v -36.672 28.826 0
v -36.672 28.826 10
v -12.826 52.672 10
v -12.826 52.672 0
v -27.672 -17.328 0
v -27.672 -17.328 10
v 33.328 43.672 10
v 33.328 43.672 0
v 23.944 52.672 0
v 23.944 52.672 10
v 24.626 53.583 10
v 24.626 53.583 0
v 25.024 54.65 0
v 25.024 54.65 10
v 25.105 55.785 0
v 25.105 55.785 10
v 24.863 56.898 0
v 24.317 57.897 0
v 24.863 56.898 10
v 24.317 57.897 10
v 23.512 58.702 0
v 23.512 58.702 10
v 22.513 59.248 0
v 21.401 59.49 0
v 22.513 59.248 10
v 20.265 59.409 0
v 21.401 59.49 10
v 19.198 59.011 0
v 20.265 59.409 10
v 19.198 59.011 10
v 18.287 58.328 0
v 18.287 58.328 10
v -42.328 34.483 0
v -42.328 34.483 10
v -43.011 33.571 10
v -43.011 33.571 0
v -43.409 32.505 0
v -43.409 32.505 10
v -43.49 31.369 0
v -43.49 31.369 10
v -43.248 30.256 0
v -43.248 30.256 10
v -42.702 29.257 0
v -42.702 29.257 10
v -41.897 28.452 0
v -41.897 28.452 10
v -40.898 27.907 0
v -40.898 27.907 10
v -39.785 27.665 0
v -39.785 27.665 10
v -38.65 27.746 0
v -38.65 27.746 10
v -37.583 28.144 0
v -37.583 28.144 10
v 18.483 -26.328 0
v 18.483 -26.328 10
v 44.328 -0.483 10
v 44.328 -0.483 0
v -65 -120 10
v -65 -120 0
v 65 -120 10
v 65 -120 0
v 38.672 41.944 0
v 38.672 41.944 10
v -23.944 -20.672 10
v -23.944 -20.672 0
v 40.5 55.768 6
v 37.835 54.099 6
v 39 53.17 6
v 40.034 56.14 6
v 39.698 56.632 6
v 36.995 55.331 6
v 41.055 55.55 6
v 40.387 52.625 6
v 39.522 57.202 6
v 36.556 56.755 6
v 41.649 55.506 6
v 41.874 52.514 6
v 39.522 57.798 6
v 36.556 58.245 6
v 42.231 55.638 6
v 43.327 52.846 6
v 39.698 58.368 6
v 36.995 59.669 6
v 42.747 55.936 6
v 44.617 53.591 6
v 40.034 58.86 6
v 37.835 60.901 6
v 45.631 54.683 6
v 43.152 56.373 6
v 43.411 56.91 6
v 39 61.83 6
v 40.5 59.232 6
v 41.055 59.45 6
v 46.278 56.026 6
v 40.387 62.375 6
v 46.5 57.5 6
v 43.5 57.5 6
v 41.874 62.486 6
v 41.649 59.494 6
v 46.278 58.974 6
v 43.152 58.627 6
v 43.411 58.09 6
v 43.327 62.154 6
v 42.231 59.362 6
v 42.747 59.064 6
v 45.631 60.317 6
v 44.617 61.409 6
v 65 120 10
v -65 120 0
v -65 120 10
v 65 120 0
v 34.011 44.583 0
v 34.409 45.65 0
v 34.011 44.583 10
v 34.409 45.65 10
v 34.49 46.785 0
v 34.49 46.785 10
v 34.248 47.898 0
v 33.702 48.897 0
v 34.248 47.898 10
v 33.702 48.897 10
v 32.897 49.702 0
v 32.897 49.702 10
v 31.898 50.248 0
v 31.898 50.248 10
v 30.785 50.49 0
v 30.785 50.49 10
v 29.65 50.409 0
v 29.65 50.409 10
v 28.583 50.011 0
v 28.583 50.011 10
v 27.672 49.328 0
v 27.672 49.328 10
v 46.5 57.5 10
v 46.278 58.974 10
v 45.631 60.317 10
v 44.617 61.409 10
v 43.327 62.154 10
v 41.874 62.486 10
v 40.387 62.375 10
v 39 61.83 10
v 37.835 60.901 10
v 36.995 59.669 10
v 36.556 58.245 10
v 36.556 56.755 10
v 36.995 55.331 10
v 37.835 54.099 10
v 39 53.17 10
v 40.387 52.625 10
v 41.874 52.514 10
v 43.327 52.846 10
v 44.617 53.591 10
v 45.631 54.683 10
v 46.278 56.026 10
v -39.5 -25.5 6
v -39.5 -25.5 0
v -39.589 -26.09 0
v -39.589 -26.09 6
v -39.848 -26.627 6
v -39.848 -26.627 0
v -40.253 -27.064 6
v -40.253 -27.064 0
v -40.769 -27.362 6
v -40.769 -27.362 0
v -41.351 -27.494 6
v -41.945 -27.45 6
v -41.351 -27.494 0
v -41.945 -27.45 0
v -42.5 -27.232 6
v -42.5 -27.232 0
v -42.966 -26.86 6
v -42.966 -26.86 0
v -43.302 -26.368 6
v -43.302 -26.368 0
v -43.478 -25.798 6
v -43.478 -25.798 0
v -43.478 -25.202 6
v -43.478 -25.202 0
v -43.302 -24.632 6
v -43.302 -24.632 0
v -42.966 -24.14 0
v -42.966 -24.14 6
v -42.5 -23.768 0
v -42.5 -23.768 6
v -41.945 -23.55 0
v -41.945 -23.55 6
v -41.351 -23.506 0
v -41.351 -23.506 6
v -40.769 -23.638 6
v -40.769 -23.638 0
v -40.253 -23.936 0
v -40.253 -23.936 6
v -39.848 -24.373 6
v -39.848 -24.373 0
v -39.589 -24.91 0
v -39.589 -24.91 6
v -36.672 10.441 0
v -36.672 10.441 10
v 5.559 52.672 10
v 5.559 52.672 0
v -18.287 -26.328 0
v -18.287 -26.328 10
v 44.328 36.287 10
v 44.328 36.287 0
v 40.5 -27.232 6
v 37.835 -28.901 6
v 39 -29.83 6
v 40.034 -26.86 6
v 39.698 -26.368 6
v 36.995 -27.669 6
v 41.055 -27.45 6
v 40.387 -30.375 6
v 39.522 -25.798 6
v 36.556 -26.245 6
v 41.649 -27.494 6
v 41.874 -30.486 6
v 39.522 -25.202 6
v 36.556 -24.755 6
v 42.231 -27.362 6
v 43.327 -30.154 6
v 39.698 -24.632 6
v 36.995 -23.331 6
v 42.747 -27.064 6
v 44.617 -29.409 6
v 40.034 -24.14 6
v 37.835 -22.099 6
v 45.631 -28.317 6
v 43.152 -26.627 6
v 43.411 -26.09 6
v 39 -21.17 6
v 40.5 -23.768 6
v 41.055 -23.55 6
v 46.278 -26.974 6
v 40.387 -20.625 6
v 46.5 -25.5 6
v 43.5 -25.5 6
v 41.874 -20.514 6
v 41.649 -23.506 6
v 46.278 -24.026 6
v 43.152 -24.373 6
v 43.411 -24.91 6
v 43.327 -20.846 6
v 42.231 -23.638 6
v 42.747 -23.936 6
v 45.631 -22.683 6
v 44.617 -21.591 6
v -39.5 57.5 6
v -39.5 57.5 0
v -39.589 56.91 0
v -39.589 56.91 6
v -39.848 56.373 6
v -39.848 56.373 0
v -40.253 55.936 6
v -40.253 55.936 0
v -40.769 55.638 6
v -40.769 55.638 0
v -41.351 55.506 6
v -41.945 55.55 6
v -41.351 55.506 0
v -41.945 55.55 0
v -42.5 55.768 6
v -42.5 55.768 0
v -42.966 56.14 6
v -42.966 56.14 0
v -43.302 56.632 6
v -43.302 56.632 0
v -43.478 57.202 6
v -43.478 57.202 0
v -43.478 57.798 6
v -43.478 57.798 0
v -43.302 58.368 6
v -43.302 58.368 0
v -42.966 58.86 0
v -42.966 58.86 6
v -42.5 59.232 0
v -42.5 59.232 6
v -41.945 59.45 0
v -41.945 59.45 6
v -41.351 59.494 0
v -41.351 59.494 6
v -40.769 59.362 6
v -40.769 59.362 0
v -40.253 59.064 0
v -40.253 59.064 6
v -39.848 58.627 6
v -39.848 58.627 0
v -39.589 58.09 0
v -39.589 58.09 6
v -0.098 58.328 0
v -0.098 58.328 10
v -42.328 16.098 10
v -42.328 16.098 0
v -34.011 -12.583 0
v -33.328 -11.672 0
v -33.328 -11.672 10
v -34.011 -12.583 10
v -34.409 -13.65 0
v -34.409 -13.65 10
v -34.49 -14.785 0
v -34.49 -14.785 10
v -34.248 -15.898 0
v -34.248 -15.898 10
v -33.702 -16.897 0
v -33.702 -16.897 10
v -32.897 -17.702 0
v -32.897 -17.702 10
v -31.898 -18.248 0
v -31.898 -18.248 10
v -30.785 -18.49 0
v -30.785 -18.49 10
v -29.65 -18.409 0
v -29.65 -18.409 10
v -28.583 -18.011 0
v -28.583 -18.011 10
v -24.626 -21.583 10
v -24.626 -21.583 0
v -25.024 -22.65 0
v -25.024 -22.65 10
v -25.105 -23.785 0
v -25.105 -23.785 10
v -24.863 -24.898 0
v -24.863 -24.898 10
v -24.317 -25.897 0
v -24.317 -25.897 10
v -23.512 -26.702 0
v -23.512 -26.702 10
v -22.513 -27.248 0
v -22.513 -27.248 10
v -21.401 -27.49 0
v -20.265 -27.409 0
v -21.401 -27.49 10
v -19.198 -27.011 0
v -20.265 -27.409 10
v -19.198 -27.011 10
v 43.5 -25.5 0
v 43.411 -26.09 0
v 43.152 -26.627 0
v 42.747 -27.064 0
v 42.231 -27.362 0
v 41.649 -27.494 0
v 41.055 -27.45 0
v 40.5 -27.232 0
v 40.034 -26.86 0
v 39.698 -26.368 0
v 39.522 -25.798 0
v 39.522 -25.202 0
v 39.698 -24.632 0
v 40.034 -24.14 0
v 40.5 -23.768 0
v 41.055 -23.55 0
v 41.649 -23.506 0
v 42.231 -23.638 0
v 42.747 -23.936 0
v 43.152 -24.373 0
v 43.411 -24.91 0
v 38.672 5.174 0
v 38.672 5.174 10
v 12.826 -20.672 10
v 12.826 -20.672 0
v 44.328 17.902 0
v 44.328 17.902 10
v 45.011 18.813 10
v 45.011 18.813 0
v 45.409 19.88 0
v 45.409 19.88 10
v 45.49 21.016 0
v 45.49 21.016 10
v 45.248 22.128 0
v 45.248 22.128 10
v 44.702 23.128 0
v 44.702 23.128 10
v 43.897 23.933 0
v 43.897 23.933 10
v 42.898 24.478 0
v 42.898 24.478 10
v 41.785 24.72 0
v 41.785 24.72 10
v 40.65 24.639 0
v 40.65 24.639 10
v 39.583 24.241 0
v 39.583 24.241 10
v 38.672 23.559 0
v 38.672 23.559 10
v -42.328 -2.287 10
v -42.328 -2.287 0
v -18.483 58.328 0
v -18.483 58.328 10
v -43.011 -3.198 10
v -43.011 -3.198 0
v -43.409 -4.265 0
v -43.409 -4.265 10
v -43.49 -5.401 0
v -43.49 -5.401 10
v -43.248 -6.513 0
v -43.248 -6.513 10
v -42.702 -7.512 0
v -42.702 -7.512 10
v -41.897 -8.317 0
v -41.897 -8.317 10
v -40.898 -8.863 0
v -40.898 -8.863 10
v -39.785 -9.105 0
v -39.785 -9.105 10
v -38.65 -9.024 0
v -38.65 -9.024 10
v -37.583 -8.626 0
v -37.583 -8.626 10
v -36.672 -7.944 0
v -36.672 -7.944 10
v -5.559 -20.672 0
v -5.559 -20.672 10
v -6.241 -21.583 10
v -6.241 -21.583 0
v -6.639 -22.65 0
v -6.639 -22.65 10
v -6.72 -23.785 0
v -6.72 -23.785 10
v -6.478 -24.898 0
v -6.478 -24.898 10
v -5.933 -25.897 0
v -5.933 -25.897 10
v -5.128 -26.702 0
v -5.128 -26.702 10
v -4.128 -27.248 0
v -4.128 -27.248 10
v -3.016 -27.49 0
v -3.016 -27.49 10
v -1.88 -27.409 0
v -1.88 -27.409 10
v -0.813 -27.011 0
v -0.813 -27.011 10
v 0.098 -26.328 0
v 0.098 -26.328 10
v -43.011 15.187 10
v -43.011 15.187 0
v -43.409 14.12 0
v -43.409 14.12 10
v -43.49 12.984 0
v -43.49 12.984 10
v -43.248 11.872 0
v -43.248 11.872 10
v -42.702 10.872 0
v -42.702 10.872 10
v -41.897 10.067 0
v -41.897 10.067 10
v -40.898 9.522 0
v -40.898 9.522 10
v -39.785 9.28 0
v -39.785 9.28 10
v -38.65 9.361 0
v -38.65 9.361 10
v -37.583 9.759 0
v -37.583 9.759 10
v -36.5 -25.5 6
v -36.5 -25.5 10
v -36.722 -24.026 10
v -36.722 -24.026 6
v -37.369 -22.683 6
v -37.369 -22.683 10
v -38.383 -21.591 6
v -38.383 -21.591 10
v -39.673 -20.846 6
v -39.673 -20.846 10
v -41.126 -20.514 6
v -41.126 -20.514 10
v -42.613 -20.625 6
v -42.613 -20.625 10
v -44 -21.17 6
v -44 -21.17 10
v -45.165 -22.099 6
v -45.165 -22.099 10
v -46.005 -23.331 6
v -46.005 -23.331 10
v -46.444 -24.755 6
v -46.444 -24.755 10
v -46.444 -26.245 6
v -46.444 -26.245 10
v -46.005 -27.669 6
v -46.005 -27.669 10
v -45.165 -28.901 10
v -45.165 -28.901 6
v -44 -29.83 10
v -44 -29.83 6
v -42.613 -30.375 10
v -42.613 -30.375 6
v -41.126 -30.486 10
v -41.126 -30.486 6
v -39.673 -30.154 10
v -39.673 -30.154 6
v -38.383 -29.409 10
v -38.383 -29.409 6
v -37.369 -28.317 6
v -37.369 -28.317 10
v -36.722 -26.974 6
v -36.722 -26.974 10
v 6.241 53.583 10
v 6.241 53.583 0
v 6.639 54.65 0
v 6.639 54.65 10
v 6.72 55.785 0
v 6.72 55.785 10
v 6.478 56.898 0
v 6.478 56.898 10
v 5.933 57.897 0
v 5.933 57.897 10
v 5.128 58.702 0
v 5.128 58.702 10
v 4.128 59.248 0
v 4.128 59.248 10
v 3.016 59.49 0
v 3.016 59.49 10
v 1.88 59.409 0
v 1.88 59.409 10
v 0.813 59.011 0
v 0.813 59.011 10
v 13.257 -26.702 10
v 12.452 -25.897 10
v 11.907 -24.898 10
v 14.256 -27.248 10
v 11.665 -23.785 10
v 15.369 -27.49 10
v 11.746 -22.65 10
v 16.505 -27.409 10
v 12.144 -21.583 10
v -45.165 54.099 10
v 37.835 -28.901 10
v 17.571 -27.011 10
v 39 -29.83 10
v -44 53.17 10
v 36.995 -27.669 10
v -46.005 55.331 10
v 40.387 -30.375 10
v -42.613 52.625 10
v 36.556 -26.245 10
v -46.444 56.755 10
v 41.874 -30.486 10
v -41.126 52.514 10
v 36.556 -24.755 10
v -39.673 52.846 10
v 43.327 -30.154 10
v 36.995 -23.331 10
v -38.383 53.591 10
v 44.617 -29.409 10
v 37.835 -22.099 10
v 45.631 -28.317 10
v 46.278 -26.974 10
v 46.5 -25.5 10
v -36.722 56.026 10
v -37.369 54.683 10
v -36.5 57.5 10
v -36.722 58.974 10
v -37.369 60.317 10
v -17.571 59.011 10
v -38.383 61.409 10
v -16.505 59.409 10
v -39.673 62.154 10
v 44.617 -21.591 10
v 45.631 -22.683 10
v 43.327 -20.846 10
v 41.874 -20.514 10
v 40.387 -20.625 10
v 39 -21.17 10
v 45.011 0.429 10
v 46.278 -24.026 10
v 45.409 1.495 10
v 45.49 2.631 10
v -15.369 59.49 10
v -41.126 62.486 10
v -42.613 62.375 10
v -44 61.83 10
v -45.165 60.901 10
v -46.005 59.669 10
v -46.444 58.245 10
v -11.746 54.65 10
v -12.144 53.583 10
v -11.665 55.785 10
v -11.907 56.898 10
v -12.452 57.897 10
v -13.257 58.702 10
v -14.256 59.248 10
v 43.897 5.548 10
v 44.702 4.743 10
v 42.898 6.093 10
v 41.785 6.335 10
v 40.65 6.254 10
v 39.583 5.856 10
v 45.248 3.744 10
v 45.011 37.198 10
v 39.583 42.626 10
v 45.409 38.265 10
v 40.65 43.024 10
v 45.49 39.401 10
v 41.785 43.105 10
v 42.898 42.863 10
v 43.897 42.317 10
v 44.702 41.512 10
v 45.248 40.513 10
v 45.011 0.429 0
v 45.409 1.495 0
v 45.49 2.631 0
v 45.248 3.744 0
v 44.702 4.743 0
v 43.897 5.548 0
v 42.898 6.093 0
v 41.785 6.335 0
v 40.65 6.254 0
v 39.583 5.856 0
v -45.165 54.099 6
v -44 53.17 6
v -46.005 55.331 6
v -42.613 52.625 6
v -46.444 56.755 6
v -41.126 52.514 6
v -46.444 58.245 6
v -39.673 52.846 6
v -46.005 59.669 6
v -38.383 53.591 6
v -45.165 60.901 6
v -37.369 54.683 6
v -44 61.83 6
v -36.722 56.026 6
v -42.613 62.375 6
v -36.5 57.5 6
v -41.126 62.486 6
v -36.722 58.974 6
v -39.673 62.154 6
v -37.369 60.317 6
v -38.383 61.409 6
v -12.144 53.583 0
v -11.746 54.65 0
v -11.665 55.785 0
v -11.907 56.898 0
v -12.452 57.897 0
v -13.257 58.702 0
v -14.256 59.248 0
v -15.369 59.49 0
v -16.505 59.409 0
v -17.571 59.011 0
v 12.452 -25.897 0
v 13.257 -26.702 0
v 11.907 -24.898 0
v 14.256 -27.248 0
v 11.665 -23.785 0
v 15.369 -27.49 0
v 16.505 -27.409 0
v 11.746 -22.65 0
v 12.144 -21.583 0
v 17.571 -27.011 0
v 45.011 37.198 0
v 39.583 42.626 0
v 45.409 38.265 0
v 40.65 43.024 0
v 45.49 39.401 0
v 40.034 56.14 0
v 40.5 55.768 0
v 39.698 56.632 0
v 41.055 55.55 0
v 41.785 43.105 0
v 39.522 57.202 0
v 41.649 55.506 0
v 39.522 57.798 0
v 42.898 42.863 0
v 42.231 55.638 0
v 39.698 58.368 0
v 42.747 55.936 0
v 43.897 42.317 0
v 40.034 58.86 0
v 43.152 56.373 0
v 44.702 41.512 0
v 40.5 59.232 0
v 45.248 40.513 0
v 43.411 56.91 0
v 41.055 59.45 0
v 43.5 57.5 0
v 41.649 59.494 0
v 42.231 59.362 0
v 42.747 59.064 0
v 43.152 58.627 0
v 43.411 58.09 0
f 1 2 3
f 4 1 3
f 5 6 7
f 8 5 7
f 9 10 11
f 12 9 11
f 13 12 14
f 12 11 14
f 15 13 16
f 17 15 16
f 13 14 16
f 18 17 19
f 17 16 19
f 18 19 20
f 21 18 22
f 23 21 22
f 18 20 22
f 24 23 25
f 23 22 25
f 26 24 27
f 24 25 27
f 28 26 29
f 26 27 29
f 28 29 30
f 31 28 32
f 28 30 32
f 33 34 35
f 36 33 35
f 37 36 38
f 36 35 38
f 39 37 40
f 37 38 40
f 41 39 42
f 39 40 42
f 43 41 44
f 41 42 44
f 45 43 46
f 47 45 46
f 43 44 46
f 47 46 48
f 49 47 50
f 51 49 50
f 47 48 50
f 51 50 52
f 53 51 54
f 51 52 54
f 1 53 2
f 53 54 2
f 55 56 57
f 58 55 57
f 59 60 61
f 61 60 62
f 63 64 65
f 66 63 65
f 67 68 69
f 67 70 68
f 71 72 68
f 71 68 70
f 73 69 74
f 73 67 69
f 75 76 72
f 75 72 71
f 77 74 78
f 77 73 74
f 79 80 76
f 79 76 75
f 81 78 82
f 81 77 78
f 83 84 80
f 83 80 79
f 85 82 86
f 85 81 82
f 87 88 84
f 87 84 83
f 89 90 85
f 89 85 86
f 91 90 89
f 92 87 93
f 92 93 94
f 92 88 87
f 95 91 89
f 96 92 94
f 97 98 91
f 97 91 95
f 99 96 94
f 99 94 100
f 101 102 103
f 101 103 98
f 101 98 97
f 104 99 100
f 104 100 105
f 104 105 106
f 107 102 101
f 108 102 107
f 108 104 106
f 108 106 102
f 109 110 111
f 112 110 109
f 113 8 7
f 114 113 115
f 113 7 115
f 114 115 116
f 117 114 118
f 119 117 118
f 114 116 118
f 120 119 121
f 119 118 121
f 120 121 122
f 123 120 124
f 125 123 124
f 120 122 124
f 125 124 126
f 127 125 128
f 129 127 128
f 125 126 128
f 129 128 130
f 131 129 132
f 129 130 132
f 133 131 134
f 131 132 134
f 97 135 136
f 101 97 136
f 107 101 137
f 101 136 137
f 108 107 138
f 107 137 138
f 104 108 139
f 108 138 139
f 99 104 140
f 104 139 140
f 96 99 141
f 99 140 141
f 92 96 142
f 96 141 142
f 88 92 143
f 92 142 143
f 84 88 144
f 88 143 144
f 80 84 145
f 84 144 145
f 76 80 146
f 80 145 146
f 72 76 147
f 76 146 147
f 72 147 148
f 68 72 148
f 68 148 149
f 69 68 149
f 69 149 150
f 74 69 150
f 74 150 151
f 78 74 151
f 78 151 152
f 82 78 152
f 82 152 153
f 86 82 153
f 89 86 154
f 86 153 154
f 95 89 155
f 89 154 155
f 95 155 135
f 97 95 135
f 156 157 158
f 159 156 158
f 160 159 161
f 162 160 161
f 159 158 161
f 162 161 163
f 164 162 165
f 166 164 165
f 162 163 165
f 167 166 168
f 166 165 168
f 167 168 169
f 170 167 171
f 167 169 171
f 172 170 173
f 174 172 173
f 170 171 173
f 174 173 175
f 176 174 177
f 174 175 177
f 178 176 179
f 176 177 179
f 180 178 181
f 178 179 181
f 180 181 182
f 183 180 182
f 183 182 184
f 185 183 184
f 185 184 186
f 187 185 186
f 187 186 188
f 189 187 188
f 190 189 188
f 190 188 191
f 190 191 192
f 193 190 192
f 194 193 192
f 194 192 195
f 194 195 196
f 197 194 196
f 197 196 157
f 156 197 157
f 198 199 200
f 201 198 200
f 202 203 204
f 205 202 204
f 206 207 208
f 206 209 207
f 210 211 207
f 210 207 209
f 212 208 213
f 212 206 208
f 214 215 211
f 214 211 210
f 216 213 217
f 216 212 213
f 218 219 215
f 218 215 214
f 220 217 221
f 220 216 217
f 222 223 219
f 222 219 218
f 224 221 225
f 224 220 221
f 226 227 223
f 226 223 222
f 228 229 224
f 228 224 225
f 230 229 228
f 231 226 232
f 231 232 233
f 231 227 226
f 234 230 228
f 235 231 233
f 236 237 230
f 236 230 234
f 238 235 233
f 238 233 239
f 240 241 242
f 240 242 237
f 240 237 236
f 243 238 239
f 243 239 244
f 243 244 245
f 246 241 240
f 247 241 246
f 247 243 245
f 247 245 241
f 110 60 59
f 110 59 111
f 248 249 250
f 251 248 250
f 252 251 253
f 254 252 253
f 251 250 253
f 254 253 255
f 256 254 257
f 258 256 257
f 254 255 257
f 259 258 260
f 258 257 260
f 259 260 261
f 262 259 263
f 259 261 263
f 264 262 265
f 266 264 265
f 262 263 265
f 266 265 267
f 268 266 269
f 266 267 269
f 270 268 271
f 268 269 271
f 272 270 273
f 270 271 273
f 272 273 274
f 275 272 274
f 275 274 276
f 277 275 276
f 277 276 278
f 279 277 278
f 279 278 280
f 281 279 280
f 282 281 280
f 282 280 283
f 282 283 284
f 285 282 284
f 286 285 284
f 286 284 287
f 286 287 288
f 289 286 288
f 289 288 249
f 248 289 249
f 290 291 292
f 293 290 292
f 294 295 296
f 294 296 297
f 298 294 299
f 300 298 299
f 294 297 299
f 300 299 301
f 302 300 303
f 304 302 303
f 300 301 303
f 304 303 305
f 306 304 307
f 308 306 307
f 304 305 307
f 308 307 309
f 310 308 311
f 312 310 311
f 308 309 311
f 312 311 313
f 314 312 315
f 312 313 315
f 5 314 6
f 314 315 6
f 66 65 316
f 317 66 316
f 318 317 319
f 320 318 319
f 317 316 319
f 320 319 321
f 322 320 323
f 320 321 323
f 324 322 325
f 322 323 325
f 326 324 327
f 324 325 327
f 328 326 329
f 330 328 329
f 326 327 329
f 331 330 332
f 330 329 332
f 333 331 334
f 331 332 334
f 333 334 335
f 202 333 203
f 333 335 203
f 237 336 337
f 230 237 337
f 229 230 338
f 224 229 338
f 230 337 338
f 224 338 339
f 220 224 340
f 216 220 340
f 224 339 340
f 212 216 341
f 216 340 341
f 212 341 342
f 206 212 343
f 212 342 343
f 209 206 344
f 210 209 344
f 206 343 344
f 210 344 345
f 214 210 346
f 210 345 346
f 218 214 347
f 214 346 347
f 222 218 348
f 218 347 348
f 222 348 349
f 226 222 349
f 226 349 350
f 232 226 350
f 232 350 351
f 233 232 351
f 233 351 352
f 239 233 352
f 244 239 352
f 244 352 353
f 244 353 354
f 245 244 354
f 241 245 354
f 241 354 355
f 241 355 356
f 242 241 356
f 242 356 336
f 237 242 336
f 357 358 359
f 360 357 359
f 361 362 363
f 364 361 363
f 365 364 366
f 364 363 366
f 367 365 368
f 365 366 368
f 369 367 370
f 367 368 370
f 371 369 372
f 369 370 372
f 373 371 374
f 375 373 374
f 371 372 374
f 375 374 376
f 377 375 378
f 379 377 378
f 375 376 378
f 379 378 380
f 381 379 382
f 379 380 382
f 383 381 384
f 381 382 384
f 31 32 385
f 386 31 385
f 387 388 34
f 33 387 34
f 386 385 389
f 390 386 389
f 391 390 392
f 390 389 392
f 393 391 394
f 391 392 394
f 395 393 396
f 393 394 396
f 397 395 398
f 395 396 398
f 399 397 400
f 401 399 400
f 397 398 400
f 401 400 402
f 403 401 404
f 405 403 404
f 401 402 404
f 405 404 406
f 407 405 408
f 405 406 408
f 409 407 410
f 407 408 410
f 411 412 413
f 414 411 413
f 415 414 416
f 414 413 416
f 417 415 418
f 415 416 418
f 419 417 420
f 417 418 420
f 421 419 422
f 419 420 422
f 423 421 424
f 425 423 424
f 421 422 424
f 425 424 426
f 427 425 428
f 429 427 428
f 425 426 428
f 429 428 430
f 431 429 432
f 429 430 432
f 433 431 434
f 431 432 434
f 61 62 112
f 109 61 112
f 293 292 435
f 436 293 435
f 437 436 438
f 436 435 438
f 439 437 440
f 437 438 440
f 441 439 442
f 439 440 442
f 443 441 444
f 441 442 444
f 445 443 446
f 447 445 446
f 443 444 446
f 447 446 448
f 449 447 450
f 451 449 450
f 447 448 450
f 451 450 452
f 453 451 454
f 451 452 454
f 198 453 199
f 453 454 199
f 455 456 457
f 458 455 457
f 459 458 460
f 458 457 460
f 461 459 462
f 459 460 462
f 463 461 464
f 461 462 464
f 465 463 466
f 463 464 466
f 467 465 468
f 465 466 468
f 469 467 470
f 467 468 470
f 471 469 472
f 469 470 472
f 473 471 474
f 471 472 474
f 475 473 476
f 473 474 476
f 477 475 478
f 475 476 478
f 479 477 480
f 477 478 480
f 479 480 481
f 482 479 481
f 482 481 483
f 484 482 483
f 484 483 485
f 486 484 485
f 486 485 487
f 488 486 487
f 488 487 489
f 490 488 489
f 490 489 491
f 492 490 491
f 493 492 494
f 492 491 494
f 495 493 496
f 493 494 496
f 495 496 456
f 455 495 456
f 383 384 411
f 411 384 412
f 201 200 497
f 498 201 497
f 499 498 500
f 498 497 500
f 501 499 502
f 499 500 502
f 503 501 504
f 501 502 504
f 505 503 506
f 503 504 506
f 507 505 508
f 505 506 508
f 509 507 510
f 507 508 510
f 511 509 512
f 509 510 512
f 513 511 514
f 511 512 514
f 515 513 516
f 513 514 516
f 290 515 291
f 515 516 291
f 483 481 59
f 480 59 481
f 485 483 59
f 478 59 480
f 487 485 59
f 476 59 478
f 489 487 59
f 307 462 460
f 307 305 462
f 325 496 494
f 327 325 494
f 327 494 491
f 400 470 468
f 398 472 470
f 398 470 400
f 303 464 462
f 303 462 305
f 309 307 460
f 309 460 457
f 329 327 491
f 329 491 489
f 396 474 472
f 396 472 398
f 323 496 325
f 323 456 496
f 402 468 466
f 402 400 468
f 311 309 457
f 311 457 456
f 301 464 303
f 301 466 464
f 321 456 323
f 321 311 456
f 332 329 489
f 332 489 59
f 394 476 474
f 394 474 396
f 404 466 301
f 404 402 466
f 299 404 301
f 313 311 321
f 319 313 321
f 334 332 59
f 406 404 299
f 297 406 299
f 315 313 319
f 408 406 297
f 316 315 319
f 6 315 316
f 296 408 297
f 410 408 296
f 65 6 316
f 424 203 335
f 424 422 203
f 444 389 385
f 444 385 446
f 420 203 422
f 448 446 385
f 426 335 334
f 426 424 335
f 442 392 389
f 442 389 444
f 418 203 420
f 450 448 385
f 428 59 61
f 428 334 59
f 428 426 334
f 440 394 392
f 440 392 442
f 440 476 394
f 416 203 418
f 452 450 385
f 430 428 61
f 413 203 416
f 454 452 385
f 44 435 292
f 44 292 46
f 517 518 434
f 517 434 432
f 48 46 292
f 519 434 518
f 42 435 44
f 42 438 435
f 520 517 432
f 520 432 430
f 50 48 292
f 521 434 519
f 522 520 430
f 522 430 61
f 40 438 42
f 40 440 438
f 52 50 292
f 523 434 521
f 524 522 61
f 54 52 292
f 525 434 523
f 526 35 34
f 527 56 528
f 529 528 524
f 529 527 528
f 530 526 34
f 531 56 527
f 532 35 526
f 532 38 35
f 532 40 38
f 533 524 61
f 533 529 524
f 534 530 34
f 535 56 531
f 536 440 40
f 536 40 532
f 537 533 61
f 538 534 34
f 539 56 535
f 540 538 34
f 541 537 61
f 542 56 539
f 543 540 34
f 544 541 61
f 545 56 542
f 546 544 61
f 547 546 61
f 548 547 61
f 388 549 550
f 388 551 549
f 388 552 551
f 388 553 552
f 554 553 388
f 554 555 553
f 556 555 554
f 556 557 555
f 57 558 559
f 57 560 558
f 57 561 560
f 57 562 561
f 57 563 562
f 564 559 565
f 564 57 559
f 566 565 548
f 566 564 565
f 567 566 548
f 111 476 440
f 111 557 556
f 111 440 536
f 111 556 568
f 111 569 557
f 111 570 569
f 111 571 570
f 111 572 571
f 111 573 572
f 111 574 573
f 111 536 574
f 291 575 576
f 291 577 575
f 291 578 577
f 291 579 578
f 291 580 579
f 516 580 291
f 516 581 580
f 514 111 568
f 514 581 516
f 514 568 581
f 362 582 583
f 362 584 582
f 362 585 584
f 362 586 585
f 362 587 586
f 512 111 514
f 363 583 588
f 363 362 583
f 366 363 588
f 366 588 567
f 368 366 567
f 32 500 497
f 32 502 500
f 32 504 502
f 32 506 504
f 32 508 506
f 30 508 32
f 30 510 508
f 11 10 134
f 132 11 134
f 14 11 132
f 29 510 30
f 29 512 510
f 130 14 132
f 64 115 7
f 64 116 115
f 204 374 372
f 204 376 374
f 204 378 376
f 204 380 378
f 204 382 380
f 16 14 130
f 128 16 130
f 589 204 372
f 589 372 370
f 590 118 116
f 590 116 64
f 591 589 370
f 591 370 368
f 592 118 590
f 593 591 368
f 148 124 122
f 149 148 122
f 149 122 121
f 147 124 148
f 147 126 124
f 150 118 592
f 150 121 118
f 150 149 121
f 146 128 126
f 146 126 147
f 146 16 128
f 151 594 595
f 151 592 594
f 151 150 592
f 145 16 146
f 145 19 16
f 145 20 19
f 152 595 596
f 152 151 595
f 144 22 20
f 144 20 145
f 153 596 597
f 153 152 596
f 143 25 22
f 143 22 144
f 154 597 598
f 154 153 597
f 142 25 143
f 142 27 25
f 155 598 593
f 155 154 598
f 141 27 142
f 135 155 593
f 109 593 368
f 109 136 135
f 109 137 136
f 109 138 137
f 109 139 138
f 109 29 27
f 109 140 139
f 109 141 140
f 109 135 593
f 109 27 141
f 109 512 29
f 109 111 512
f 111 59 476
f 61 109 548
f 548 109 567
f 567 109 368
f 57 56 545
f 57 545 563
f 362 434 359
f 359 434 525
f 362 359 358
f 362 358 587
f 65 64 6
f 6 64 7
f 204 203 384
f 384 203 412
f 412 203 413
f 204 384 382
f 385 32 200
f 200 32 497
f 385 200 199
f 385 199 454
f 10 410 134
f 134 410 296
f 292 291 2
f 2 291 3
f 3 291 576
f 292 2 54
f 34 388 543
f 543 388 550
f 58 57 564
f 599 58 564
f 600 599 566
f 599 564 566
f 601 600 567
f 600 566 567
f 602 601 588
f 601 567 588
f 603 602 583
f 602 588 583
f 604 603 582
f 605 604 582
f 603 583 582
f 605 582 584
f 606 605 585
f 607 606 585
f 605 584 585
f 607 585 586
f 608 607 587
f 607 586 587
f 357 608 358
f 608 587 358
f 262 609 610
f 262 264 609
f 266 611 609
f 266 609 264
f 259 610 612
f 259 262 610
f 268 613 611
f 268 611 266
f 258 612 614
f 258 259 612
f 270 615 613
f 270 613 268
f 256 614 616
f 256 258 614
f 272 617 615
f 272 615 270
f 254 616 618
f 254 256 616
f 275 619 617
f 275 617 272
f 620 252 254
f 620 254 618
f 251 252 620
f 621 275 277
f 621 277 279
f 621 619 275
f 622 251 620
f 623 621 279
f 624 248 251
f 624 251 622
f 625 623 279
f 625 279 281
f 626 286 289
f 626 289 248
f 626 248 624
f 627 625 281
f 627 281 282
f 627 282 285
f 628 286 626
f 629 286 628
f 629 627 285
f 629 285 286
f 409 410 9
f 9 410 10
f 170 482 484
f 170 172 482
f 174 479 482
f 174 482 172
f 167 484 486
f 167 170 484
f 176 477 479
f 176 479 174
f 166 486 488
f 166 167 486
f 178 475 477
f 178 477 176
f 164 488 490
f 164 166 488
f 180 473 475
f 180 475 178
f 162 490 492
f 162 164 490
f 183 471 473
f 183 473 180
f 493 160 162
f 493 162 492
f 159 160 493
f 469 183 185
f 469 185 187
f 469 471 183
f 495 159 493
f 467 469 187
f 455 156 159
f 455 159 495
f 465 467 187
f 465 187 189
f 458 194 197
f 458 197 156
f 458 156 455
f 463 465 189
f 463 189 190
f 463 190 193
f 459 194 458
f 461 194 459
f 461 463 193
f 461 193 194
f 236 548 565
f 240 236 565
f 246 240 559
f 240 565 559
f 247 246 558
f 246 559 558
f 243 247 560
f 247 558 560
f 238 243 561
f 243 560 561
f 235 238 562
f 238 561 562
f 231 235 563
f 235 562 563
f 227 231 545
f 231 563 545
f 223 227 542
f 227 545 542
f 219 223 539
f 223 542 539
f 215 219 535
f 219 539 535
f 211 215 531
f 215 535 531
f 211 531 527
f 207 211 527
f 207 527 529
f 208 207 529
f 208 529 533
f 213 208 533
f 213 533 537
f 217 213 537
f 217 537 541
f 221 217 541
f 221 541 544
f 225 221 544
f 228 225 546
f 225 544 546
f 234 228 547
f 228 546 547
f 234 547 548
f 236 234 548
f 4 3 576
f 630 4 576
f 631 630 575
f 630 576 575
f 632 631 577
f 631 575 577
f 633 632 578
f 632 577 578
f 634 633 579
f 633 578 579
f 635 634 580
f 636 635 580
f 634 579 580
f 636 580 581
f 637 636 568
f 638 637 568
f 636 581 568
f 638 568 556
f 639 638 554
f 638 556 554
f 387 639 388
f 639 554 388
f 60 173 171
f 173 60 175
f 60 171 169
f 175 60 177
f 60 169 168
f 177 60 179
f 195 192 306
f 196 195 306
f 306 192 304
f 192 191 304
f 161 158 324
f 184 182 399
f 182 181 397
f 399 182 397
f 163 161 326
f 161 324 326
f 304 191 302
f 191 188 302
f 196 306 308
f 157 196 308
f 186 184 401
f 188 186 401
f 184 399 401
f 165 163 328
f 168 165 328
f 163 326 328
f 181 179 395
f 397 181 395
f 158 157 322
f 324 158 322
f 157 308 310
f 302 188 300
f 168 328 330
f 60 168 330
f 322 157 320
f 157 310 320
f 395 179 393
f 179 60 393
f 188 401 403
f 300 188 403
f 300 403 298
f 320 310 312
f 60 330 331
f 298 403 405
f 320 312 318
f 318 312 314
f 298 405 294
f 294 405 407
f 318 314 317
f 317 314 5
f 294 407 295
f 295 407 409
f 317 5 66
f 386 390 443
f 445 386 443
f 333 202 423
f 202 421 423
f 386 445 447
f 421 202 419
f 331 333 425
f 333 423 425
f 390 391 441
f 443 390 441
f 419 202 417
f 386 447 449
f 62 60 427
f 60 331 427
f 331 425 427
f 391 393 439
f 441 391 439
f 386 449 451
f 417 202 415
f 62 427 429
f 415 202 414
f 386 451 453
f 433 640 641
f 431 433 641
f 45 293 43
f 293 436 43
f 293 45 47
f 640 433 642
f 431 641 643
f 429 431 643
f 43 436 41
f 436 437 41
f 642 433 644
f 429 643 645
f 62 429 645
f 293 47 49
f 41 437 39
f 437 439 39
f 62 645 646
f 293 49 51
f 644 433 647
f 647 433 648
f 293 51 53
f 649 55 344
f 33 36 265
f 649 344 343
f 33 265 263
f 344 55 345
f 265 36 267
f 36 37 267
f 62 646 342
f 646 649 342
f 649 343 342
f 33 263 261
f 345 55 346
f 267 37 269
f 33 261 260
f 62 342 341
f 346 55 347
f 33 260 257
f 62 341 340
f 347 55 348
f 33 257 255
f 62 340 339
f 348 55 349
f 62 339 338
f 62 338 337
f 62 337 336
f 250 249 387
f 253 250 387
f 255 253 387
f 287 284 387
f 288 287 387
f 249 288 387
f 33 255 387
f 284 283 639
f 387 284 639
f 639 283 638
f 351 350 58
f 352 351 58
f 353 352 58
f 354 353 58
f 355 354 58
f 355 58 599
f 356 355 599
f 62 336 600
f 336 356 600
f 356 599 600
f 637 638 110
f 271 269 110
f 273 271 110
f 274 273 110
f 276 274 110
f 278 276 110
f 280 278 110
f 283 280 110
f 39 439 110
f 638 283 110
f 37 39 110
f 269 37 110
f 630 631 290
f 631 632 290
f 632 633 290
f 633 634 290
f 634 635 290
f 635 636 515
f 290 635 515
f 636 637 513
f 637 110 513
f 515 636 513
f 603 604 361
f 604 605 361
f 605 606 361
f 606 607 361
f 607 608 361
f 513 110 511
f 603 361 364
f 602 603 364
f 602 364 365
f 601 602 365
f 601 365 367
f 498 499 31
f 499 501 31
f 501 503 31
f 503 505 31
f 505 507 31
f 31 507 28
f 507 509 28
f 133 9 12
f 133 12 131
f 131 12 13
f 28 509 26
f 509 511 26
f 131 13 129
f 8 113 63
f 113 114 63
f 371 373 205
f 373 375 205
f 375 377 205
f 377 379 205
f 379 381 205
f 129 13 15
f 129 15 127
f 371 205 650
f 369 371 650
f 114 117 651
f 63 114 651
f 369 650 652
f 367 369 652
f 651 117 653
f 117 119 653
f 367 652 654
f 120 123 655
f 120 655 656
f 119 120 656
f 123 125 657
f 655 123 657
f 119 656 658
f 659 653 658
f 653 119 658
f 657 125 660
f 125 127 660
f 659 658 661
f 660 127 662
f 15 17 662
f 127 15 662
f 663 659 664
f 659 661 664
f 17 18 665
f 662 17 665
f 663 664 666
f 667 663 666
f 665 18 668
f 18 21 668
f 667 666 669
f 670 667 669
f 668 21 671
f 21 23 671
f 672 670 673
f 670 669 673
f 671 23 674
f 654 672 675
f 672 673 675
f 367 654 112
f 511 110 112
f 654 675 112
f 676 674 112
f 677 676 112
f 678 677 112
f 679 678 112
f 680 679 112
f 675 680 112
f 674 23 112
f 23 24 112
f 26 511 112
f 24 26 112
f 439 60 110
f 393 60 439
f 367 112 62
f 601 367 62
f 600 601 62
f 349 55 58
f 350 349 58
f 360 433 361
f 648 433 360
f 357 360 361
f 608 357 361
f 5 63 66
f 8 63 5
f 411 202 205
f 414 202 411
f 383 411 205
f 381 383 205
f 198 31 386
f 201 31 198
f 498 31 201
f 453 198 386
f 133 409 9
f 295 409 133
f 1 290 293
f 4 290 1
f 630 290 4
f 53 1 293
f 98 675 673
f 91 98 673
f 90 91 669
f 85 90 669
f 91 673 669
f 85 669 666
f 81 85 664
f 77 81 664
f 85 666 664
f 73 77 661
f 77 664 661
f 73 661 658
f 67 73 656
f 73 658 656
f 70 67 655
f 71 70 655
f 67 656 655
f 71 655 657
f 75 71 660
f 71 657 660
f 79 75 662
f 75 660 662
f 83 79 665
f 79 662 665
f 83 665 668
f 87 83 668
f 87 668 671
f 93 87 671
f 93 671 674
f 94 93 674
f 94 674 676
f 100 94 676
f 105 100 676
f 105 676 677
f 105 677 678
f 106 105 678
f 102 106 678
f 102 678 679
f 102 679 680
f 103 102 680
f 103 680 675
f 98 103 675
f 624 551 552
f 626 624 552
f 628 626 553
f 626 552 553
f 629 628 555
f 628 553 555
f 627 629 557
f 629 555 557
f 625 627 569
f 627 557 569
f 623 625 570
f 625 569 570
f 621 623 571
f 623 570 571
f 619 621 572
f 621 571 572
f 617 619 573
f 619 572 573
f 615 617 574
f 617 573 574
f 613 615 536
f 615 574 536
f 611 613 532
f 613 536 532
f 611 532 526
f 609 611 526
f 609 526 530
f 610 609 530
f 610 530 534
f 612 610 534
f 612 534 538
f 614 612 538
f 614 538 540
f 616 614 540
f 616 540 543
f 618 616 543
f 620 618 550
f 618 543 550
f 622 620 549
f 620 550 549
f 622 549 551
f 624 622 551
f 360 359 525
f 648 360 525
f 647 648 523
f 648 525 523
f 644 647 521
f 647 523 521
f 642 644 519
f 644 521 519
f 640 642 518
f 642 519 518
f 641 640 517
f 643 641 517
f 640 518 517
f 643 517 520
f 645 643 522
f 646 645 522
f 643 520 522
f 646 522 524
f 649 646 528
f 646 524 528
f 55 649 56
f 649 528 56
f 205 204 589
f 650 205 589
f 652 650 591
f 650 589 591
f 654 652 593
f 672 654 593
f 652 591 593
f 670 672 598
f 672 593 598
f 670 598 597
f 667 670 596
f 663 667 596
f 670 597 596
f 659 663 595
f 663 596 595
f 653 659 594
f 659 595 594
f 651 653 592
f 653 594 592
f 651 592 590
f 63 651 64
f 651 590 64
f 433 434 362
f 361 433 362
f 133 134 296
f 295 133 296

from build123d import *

# Parameters (mm, degrees)
SKETCH008_W          = 130
SKETCH008_H          = 240
PAD005_DEPTH         = 10
SKETCH009_R          = 2
POCKET003_DEPTH      = 10.001
POCKET003_DEPTH_BACK = 0.001
SKETCH010_R          = 5
POCKET004_DEPTH      = 4
POCKET005_DEPTH      = 10.001
POCKET005_DEPTH_BACK = 0.001


with BuildPart() as part:
    # Sketch008 → Pad005 (new body)
    with BuildSketch(Plane.XY):
        Rectangle(SKETCH008_W, SKETCH008_H)
    extrude(amount=PAD005_DEPTH)

    # Sketch009 (on Face5 of Pad005) → Pocket003 (cut, two sides)
    with BuildSketch(Plane(origin=(0, 0, 0), x_dir=(1, 0, 0), z_dir=(0, 0, -1))) as pocket003_sk:
        with Locations((-41.5, -57.5)):
            Circle(SKETCH009_R)
        with Locations((-41.5, 25.5)):
            Circle(SKETCH009_R)
        with Locations((41.5, 25.5)):
            Circle(SKETCH009_R)
        with Locations((41.5, -57.5)):
            Circle(SKETCH009_R)
    extrude(amount=-POCKET003_DEPTH, mode=Mode.SUBTRACT)
    extrude(pocket003_sk.sketch, amount=POCKET003_DEPTH_BACK, mode=Mode.SUBTRACT)

    # Sketch010 (on Face5 of Pocket003) → Pocket004 (cut)
    with BuildSketch(Plane.XY.offset(10)):
        with Locations((-41.5, 57.5)):
            Circle(SKETCH010_R)
        with Locations((41.5, 57.5)):
            Circle(SKETCH010_R)
        with Locations((-41.5, -25.5)):
            Circle(SKETCH010_R)
        with Locations((41.5, -25.5)):
            Circle(SKETCH010_R)
    extrude(amount=-POCKET004_DEPTH, mode=Mode.SUBTRACT)

    # Sketch011 (on Face5 of Pocket004) → Pocket005 (cut, two sides)
    with BuildSketch(Plane.XY.offset(10)) as pocket005_sk:
        with BuildLine():
            ThreePointArc((-33.328427, -11.671573), (-33.328427, -17.328427), (-27.671573, -17.328427))
            Line((-27.671573, -17.328427), (33.328427, 43.671573))
            ThreePointArc((33.328427, 43.671573), (33.328427, 49.328427), (27.671573, 49.328427))
            Line((27.671573, 49.328427), (-33.328427, -11.671573))
        make_face()
        with BuildLine():
            ThreePointArc((-42.328427, -2.286797), (-42.328427, -7.943651), (-36.671573, -7.943651))
            Line((-36.671573, -7.943651), (23.943651, 52.671573))
            ThreePointArc((23.943651, 52.671573), (23.943651, 58.328427), (18.286797, 58.328427))
            Line((18.286797, 58.328427), (-42.328427, -2.286797))
        make_face()
        with BuildLine():
            ThreePointArc((-42.328427, 16.09798), (-42.328427, 10.441125), (-36.671573, 10.441125))
            Line((-36.671573, 10.441125), (5.558875, 52.671573))
            ThreePointArc((5.558875, 52.671573), (5.558875, 58.328427), (-0.09798, 58.328427))
            Line((-0.09798, 58.328427), (-42.328427, 16.09798))
        make_face()
        with BuildLine():
            ThreePointArc((-42.328427, 34.482756), (-42.328427, 28.825902), (-36.671573, 28.825902))
            Line((-36.671573, 28.825902), (-12.825902, 52.671573))
            ThreePointArc((-12.825902, 52.671573), (-12.825902, 58.328427), (-18.482756, 58.328427))
            Line((-18.482756, 58.328427), (-42.328427, 34.482756))
        make_face()
        with BuildLine():
            ThreePointArc((-23.943651, -20.671573), (-23.943651, -26.328427), (-18.286797, -26.328427))
            Line((-18.286797, -26.328427), (44.328427, 36.286797))
            ThreePointArc((44.328427, 36.286797), (44.328427, 41.943651), (38.671573, 41.943651))
            Line((38.671573, 41.943651), (-23.943651, -20.671573))
        make_face()
        with BuildLine():
            ThreePointArc((-5.558875, -20.671573), (-5.558875, -26.328427), (0.09798, -26.328427))
            Line((0.09798, -26.328427), (44.328427, 17.90202))
            ThreePointArc((44.328427, 17.90202), (44.328427, 23.558875), (38.671573, 23.558875))
            Line((38.671573, 23.558875), (-5.558875, -20.671573))
        make_face()
        with BuildLine():
            ThreePointArc((12.825902, -20.671573), (12.825902, -26.328427), (18.482756, -26.328427))
            Line((18.482756, -26.328427), (44.328427, -0.482756))
            ThreePointArc((44.328427, -0.482756), (44.328427, 5.174098), (38.671573, 5.174098))
            Line((38.671573, 5.174098), (12.825902, -20.671573))
        make_face()
    extrude(amount=-POCKET005_DEPTH, mode=Mode.SUBTRACT)
    extrude(pocket005_sk.sketch, amount=POCKET005_DEPTH_BACK, mode=Mode.SUBTRACT)


solid = part.part
